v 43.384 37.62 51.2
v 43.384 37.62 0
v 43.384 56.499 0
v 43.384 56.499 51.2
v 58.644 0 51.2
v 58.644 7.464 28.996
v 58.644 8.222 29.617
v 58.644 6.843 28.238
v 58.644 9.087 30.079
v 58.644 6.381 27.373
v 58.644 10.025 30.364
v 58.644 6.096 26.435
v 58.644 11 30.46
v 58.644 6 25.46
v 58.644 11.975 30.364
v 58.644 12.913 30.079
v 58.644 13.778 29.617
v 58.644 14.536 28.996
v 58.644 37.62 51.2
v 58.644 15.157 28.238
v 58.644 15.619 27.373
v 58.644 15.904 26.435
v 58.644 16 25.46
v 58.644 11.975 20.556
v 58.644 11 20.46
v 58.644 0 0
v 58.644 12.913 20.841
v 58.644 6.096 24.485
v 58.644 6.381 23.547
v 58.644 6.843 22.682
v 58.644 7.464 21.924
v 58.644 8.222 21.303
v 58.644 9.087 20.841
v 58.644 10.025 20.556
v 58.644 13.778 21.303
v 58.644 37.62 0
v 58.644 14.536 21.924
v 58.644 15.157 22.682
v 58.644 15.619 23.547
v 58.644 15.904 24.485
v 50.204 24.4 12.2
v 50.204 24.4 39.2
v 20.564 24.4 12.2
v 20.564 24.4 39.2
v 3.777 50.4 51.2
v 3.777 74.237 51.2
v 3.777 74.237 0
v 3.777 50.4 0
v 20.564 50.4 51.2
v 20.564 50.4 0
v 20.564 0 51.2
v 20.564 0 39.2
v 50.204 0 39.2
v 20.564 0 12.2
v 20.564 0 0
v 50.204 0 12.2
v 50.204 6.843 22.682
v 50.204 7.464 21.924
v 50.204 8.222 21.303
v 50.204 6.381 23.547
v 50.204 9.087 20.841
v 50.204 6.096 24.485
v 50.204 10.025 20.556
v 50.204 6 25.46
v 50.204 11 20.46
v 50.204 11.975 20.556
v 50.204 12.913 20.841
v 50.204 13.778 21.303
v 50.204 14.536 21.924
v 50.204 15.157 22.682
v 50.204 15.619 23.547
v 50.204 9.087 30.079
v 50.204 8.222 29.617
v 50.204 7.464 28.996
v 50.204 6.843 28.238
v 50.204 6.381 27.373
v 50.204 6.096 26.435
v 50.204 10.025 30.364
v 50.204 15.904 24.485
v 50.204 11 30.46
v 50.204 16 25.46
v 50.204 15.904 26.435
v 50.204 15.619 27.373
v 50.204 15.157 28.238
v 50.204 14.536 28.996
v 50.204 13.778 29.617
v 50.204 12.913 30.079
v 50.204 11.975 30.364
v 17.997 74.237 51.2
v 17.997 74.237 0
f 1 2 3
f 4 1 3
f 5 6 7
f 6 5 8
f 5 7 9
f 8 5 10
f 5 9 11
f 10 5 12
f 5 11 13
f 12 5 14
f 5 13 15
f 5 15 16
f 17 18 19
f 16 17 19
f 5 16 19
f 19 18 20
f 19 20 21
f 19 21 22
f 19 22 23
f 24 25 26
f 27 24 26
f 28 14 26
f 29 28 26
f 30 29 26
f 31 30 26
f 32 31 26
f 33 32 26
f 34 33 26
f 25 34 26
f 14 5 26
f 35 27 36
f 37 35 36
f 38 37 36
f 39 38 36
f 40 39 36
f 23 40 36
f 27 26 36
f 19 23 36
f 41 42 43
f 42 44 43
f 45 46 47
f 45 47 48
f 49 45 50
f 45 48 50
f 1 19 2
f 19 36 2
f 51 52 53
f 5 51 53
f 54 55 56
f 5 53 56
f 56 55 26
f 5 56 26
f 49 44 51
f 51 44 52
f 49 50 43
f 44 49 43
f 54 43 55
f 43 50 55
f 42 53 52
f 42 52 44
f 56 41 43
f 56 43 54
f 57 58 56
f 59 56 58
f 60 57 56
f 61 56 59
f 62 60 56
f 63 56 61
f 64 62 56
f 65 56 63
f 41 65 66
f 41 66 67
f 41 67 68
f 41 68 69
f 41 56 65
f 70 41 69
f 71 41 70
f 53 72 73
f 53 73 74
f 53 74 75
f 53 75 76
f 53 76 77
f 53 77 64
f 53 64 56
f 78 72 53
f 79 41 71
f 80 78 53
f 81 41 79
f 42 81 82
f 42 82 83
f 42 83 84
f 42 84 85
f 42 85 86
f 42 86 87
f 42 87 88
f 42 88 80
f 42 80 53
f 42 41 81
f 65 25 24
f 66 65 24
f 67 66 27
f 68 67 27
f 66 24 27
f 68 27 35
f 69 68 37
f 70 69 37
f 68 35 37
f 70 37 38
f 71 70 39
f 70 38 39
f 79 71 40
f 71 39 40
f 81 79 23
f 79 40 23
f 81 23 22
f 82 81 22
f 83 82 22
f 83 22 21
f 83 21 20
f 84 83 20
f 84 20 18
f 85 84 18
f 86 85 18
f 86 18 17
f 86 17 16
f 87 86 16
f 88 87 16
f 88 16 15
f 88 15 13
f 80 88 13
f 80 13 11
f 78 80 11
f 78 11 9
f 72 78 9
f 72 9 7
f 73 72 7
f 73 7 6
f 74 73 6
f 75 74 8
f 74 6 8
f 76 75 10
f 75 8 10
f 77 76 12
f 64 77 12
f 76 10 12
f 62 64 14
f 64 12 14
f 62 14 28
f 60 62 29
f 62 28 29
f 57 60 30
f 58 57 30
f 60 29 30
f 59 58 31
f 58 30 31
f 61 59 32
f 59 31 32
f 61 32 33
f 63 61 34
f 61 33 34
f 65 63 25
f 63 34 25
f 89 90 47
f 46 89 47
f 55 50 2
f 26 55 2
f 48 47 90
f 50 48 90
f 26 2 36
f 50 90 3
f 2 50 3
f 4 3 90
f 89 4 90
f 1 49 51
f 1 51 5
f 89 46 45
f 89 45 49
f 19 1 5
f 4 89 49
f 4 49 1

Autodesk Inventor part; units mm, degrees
ref_plane "YZ Plane" through (0, 0, 0) normal (1, 0, 0) x (0, 1, 0)
ref_plane "XZ Plane" through (0, 0, 0) normal (0, 1, 0) x (-1, 0, 0)
ref_plane "XY Plane" through (0, 0, 0) normal (0, 0, 1) x (1, 0, 0)
sketch "草圖1" plane through (0, 0, 0) normal (0, 0, 1) x (1, 0, 0)
  line L0 (20.5635, 0) -> (58.6435, 0)
  line L1 (58.6435, 0) -> (58.6435, 37.62)
  line L2 (58.6435, 37.62) -> (43.3835, 37.62)
  line L3 (43.3835, 37.62) -> (43.3835, 56.4986)
  line L4 (43.3835, 56.4986) -> (17.9968, 74.2368)
  line L5 (17.9968, 74.2368) -> (3.7768, 74.2368)
  line L6 (3.7768, 74.2368) -> (3.7768, 50.4)
  line L7 (3.7768, 50.4) -> (20.5635, 50.4)
  line L8 (20.5635, 50.4) -> (20.5635, 0)
  point P0 (0, 0)
  dimension "d0" = 38.08
  dimension "d1" = 37.62
  dimension "d2" = 15.26
  dimension "d3" = 50.4
  dimension "d4" = 14.22
extrude "擠出1" add sketch "草圖1" along normal blind 51.2
sketch "草圖2" plane through (58.6435, 0, 0) normal (1, 0, 0) x (0, 0, -1)
  circle A0 centre (-25.46, 11) radius 5
  line L0 (0, 37.62) -> (0, 0) projected
  line L1 (0, 0) -> (-51.2, 0) projected
  dimension "d7" = 10
  dimension "d8" = 25.46
  dimension "d9" = 11
extrude "擠出2" cut sketch "草圖2" against normal blind 51.2
sketch "草圖3" plane through (20.5635, 0, 0) normal (-1, 0, 0) x (0, 0, 1)
  line L0 (39.2, 0) -> (39.2, 24.4)
  line L1 (39.2, 24.4) -> (12.2, 24.4)
  line L2 (12.2, 24.4) -> (12.2, 0)
  line L3 (51.2, 50.4) -> (51.2, 0) projected
  line L4 (12.2, 0) -> (12.2, -12.2233)
  line L5 (12.2, -12.2233) -> (39.2, -4.7386)
  line L6 (39.2, -4.7386) -> (39.2, 0)
  dimension "d12" = 27
  dimension "d13" = 12
extrude "擠出3" cut sketch "草圖3" against normal blind 29.64
properties part number "小虎鉗-右側" material "鋁合金 6061"
